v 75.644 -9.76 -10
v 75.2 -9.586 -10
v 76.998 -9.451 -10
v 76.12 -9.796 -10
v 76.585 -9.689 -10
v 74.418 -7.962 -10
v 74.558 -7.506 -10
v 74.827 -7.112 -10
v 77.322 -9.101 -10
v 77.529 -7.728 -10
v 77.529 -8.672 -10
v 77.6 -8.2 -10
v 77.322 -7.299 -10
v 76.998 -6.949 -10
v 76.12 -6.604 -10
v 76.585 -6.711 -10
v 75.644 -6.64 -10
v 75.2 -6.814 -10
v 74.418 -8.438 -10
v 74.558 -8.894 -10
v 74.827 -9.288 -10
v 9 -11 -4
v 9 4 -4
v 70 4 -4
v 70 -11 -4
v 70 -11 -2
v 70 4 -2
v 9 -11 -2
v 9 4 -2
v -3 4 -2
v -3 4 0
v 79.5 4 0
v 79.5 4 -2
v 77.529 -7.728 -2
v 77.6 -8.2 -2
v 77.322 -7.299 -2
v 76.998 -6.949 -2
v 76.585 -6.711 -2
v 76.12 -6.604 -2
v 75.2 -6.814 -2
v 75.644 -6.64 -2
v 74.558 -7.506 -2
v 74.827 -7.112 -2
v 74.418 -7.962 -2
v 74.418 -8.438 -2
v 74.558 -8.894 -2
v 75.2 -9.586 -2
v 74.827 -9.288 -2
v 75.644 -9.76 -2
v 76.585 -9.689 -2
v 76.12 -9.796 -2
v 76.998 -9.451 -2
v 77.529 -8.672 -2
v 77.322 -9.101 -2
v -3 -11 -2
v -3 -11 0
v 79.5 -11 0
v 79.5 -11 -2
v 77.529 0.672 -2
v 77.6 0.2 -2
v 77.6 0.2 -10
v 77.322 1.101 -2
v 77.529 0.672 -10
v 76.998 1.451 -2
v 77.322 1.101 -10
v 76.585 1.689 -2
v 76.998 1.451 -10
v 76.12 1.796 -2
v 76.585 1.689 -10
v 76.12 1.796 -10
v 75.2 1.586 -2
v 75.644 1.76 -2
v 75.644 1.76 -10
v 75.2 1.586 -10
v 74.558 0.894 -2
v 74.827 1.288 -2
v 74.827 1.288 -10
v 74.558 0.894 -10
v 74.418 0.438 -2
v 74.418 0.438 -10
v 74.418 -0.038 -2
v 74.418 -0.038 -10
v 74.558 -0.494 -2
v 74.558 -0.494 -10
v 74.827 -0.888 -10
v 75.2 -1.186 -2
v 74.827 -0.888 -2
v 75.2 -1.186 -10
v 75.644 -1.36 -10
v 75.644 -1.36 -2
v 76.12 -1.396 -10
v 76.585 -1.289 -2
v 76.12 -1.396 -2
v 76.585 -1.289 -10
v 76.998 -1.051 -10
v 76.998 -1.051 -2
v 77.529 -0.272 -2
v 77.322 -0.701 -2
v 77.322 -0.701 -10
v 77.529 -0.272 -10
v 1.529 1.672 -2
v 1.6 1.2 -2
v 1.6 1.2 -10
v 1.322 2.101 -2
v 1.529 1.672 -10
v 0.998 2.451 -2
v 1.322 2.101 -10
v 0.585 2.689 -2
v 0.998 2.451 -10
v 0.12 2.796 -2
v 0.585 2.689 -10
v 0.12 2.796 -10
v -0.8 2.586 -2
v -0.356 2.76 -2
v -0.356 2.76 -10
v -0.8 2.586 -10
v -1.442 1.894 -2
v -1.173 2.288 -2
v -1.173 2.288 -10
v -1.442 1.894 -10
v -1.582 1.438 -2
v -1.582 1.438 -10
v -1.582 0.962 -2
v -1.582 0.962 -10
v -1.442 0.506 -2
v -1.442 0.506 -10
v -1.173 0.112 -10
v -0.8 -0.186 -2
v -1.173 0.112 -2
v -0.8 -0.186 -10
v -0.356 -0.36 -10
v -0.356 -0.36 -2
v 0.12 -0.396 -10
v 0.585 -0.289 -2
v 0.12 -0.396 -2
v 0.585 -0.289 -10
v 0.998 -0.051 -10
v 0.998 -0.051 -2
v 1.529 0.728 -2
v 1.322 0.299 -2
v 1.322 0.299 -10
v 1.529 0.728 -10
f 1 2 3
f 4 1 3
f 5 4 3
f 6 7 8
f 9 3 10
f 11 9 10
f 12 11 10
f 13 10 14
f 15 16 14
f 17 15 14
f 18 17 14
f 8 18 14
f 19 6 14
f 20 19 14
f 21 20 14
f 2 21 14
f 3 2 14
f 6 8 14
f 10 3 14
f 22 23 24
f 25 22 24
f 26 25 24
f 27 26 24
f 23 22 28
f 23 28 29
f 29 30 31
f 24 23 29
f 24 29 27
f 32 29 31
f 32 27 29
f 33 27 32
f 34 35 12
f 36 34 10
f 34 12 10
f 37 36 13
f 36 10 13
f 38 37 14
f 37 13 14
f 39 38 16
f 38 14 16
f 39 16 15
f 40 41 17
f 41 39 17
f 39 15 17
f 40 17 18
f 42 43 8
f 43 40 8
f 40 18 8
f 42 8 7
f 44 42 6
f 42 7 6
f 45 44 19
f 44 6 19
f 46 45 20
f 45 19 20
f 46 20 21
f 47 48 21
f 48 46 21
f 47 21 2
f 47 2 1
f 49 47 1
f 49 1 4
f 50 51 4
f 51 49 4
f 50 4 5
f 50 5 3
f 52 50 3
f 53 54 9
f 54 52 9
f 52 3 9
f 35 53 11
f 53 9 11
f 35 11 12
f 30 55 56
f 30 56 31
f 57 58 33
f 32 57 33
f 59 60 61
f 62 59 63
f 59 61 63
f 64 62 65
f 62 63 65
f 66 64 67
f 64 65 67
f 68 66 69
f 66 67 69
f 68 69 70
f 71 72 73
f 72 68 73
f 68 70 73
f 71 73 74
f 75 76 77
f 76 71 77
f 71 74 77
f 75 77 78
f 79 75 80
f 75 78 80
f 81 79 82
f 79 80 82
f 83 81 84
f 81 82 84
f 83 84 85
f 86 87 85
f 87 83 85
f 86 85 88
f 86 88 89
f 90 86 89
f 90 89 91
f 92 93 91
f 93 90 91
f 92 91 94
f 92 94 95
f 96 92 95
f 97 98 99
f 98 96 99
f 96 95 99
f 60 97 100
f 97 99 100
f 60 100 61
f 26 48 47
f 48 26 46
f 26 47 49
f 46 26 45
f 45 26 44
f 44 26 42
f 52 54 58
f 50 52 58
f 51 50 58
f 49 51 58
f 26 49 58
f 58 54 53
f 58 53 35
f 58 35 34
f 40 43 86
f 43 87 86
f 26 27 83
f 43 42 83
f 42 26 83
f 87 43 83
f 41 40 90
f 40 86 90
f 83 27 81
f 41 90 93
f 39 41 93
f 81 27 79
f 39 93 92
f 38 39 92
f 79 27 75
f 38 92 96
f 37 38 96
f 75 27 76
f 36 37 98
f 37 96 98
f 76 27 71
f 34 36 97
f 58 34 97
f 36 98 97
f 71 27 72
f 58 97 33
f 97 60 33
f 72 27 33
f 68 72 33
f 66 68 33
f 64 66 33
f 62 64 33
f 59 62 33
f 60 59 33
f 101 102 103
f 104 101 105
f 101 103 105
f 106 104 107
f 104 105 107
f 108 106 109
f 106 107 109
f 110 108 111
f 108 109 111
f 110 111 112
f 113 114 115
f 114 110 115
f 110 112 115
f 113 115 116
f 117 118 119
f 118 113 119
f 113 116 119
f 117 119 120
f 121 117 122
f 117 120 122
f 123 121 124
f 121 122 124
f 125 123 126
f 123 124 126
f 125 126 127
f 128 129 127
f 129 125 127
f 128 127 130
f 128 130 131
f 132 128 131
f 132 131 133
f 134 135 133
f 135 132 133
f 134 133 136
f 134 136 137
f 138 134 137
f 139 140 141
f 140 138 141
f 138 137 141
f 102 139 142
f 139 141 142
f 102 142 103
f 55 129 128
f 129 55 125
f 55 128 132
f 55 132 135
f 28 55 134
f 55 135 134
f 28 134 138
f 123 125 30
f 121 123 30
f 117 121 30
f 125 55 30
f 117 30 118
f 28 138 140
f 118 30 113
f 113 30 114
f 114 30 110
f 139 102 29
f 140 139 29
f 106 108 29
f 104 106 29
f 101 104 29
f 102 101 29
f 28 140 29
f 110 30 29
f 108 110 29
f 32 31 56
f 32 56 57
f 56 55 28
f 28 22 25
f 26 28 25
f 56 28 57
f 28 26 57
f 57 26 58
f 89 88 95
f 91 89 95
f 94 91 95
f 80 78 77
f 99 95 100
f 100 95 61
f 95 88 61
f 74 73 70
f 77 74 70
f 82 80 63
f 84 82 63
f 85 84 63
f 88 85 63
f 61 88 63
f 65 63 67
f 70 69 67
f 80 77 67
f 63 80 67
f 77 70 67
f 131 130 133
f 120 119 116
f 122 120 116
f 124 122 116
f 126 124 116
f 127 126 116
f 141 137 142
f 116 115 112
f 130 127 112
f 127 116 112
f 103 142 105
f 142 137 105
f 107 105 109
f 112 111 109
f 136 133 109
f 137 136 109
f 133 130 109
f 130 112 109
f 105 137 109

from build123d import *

# Parameters (mm, degrees)
CYLINDER_R        = 1.6
CYLINDER_DEPTH    = 10
BOX001_W          = 61
BOX001_H          = 15
BOX001_DEPTH      = 2
BOX_W             = 82.5
BOX_H             = 15
BOX_DEPTH         = 2
CYLINDER003_R     = 1.6
CYLINDER003_DEPTH = 10
CYLINDER002_R     = 1.6
CYLINDER002_DEPTH = 10


with BuildPart() as taladro1:
    # Cylinder → Cylinder (new body)
    with BuildSketch(Plane(origin=(0, 1.2, -10), x_dir=(1, 0, 0), z_dir=(0, 0, 1))):
        Circle(CYLINDER_R)
    extrude(amount=CYLINDER_DEPTH)


with BuildPart() as perfora_2mm_centro:
    # Box001 → Box001 (new body)
    with BuildSketch(Plane(origin=(12, 0, -2), x_dir=(1, 0, 0), z_dir=(0, 0, 1))):
        with Locations((30.5, 7.5)):
            Rectangle(BOX001_W, BOX001_H)
    extrude(amount=BOX001_DEPTH)


with BuildPart() as fusion001:
    # Box → Box (new body)
    with BuildSketch(Plane.XY):
        with Locations((41.25, 7.5)):
            Rectangle(BOX_W, BOX_H)
    extrude(amount=BOX_DEPTH)

    # Fusion: union perfora_2mm_centro
    add(perfora_2mm_centro.part)


with BuildPart() as fusion001_1:
    # Fusion placement: moved
    add(fusion001.part.moved(Location((-3, -11, -2))))

    # Fusion001: union taladro1
    add(taladro1.part)


with BuildPart() as fusion002:
    # Cylinder003 → Cylinder003 (new body)
    with BuildSketch(Plane(origin=(76, 0.2, -10), x_dir=(1, 0, 0), z_dir=(0, 0, 1))):
        Circle(CYLINDER003_R)
    extrude(amount=CYLINDER003_DEPTH)

    # Fusion002: union Fusion001
    add(fusion001_1.part)


with BuildPart() as fusion007:
    # Cylinder002 → Cylinder002 (new body)
    with BuildSketch(Plane(origin=(76, -8.2, -10), x_dir=(1, 0, 0), z_dir=(0, 0, 1))):
        Circle(CYLINDER002_R)
    extrude(amount=CYLINDER002_DEPTH)

    # Fusion007: union Fusion002
    add(fusion002.part)


solid = fusion007.part
